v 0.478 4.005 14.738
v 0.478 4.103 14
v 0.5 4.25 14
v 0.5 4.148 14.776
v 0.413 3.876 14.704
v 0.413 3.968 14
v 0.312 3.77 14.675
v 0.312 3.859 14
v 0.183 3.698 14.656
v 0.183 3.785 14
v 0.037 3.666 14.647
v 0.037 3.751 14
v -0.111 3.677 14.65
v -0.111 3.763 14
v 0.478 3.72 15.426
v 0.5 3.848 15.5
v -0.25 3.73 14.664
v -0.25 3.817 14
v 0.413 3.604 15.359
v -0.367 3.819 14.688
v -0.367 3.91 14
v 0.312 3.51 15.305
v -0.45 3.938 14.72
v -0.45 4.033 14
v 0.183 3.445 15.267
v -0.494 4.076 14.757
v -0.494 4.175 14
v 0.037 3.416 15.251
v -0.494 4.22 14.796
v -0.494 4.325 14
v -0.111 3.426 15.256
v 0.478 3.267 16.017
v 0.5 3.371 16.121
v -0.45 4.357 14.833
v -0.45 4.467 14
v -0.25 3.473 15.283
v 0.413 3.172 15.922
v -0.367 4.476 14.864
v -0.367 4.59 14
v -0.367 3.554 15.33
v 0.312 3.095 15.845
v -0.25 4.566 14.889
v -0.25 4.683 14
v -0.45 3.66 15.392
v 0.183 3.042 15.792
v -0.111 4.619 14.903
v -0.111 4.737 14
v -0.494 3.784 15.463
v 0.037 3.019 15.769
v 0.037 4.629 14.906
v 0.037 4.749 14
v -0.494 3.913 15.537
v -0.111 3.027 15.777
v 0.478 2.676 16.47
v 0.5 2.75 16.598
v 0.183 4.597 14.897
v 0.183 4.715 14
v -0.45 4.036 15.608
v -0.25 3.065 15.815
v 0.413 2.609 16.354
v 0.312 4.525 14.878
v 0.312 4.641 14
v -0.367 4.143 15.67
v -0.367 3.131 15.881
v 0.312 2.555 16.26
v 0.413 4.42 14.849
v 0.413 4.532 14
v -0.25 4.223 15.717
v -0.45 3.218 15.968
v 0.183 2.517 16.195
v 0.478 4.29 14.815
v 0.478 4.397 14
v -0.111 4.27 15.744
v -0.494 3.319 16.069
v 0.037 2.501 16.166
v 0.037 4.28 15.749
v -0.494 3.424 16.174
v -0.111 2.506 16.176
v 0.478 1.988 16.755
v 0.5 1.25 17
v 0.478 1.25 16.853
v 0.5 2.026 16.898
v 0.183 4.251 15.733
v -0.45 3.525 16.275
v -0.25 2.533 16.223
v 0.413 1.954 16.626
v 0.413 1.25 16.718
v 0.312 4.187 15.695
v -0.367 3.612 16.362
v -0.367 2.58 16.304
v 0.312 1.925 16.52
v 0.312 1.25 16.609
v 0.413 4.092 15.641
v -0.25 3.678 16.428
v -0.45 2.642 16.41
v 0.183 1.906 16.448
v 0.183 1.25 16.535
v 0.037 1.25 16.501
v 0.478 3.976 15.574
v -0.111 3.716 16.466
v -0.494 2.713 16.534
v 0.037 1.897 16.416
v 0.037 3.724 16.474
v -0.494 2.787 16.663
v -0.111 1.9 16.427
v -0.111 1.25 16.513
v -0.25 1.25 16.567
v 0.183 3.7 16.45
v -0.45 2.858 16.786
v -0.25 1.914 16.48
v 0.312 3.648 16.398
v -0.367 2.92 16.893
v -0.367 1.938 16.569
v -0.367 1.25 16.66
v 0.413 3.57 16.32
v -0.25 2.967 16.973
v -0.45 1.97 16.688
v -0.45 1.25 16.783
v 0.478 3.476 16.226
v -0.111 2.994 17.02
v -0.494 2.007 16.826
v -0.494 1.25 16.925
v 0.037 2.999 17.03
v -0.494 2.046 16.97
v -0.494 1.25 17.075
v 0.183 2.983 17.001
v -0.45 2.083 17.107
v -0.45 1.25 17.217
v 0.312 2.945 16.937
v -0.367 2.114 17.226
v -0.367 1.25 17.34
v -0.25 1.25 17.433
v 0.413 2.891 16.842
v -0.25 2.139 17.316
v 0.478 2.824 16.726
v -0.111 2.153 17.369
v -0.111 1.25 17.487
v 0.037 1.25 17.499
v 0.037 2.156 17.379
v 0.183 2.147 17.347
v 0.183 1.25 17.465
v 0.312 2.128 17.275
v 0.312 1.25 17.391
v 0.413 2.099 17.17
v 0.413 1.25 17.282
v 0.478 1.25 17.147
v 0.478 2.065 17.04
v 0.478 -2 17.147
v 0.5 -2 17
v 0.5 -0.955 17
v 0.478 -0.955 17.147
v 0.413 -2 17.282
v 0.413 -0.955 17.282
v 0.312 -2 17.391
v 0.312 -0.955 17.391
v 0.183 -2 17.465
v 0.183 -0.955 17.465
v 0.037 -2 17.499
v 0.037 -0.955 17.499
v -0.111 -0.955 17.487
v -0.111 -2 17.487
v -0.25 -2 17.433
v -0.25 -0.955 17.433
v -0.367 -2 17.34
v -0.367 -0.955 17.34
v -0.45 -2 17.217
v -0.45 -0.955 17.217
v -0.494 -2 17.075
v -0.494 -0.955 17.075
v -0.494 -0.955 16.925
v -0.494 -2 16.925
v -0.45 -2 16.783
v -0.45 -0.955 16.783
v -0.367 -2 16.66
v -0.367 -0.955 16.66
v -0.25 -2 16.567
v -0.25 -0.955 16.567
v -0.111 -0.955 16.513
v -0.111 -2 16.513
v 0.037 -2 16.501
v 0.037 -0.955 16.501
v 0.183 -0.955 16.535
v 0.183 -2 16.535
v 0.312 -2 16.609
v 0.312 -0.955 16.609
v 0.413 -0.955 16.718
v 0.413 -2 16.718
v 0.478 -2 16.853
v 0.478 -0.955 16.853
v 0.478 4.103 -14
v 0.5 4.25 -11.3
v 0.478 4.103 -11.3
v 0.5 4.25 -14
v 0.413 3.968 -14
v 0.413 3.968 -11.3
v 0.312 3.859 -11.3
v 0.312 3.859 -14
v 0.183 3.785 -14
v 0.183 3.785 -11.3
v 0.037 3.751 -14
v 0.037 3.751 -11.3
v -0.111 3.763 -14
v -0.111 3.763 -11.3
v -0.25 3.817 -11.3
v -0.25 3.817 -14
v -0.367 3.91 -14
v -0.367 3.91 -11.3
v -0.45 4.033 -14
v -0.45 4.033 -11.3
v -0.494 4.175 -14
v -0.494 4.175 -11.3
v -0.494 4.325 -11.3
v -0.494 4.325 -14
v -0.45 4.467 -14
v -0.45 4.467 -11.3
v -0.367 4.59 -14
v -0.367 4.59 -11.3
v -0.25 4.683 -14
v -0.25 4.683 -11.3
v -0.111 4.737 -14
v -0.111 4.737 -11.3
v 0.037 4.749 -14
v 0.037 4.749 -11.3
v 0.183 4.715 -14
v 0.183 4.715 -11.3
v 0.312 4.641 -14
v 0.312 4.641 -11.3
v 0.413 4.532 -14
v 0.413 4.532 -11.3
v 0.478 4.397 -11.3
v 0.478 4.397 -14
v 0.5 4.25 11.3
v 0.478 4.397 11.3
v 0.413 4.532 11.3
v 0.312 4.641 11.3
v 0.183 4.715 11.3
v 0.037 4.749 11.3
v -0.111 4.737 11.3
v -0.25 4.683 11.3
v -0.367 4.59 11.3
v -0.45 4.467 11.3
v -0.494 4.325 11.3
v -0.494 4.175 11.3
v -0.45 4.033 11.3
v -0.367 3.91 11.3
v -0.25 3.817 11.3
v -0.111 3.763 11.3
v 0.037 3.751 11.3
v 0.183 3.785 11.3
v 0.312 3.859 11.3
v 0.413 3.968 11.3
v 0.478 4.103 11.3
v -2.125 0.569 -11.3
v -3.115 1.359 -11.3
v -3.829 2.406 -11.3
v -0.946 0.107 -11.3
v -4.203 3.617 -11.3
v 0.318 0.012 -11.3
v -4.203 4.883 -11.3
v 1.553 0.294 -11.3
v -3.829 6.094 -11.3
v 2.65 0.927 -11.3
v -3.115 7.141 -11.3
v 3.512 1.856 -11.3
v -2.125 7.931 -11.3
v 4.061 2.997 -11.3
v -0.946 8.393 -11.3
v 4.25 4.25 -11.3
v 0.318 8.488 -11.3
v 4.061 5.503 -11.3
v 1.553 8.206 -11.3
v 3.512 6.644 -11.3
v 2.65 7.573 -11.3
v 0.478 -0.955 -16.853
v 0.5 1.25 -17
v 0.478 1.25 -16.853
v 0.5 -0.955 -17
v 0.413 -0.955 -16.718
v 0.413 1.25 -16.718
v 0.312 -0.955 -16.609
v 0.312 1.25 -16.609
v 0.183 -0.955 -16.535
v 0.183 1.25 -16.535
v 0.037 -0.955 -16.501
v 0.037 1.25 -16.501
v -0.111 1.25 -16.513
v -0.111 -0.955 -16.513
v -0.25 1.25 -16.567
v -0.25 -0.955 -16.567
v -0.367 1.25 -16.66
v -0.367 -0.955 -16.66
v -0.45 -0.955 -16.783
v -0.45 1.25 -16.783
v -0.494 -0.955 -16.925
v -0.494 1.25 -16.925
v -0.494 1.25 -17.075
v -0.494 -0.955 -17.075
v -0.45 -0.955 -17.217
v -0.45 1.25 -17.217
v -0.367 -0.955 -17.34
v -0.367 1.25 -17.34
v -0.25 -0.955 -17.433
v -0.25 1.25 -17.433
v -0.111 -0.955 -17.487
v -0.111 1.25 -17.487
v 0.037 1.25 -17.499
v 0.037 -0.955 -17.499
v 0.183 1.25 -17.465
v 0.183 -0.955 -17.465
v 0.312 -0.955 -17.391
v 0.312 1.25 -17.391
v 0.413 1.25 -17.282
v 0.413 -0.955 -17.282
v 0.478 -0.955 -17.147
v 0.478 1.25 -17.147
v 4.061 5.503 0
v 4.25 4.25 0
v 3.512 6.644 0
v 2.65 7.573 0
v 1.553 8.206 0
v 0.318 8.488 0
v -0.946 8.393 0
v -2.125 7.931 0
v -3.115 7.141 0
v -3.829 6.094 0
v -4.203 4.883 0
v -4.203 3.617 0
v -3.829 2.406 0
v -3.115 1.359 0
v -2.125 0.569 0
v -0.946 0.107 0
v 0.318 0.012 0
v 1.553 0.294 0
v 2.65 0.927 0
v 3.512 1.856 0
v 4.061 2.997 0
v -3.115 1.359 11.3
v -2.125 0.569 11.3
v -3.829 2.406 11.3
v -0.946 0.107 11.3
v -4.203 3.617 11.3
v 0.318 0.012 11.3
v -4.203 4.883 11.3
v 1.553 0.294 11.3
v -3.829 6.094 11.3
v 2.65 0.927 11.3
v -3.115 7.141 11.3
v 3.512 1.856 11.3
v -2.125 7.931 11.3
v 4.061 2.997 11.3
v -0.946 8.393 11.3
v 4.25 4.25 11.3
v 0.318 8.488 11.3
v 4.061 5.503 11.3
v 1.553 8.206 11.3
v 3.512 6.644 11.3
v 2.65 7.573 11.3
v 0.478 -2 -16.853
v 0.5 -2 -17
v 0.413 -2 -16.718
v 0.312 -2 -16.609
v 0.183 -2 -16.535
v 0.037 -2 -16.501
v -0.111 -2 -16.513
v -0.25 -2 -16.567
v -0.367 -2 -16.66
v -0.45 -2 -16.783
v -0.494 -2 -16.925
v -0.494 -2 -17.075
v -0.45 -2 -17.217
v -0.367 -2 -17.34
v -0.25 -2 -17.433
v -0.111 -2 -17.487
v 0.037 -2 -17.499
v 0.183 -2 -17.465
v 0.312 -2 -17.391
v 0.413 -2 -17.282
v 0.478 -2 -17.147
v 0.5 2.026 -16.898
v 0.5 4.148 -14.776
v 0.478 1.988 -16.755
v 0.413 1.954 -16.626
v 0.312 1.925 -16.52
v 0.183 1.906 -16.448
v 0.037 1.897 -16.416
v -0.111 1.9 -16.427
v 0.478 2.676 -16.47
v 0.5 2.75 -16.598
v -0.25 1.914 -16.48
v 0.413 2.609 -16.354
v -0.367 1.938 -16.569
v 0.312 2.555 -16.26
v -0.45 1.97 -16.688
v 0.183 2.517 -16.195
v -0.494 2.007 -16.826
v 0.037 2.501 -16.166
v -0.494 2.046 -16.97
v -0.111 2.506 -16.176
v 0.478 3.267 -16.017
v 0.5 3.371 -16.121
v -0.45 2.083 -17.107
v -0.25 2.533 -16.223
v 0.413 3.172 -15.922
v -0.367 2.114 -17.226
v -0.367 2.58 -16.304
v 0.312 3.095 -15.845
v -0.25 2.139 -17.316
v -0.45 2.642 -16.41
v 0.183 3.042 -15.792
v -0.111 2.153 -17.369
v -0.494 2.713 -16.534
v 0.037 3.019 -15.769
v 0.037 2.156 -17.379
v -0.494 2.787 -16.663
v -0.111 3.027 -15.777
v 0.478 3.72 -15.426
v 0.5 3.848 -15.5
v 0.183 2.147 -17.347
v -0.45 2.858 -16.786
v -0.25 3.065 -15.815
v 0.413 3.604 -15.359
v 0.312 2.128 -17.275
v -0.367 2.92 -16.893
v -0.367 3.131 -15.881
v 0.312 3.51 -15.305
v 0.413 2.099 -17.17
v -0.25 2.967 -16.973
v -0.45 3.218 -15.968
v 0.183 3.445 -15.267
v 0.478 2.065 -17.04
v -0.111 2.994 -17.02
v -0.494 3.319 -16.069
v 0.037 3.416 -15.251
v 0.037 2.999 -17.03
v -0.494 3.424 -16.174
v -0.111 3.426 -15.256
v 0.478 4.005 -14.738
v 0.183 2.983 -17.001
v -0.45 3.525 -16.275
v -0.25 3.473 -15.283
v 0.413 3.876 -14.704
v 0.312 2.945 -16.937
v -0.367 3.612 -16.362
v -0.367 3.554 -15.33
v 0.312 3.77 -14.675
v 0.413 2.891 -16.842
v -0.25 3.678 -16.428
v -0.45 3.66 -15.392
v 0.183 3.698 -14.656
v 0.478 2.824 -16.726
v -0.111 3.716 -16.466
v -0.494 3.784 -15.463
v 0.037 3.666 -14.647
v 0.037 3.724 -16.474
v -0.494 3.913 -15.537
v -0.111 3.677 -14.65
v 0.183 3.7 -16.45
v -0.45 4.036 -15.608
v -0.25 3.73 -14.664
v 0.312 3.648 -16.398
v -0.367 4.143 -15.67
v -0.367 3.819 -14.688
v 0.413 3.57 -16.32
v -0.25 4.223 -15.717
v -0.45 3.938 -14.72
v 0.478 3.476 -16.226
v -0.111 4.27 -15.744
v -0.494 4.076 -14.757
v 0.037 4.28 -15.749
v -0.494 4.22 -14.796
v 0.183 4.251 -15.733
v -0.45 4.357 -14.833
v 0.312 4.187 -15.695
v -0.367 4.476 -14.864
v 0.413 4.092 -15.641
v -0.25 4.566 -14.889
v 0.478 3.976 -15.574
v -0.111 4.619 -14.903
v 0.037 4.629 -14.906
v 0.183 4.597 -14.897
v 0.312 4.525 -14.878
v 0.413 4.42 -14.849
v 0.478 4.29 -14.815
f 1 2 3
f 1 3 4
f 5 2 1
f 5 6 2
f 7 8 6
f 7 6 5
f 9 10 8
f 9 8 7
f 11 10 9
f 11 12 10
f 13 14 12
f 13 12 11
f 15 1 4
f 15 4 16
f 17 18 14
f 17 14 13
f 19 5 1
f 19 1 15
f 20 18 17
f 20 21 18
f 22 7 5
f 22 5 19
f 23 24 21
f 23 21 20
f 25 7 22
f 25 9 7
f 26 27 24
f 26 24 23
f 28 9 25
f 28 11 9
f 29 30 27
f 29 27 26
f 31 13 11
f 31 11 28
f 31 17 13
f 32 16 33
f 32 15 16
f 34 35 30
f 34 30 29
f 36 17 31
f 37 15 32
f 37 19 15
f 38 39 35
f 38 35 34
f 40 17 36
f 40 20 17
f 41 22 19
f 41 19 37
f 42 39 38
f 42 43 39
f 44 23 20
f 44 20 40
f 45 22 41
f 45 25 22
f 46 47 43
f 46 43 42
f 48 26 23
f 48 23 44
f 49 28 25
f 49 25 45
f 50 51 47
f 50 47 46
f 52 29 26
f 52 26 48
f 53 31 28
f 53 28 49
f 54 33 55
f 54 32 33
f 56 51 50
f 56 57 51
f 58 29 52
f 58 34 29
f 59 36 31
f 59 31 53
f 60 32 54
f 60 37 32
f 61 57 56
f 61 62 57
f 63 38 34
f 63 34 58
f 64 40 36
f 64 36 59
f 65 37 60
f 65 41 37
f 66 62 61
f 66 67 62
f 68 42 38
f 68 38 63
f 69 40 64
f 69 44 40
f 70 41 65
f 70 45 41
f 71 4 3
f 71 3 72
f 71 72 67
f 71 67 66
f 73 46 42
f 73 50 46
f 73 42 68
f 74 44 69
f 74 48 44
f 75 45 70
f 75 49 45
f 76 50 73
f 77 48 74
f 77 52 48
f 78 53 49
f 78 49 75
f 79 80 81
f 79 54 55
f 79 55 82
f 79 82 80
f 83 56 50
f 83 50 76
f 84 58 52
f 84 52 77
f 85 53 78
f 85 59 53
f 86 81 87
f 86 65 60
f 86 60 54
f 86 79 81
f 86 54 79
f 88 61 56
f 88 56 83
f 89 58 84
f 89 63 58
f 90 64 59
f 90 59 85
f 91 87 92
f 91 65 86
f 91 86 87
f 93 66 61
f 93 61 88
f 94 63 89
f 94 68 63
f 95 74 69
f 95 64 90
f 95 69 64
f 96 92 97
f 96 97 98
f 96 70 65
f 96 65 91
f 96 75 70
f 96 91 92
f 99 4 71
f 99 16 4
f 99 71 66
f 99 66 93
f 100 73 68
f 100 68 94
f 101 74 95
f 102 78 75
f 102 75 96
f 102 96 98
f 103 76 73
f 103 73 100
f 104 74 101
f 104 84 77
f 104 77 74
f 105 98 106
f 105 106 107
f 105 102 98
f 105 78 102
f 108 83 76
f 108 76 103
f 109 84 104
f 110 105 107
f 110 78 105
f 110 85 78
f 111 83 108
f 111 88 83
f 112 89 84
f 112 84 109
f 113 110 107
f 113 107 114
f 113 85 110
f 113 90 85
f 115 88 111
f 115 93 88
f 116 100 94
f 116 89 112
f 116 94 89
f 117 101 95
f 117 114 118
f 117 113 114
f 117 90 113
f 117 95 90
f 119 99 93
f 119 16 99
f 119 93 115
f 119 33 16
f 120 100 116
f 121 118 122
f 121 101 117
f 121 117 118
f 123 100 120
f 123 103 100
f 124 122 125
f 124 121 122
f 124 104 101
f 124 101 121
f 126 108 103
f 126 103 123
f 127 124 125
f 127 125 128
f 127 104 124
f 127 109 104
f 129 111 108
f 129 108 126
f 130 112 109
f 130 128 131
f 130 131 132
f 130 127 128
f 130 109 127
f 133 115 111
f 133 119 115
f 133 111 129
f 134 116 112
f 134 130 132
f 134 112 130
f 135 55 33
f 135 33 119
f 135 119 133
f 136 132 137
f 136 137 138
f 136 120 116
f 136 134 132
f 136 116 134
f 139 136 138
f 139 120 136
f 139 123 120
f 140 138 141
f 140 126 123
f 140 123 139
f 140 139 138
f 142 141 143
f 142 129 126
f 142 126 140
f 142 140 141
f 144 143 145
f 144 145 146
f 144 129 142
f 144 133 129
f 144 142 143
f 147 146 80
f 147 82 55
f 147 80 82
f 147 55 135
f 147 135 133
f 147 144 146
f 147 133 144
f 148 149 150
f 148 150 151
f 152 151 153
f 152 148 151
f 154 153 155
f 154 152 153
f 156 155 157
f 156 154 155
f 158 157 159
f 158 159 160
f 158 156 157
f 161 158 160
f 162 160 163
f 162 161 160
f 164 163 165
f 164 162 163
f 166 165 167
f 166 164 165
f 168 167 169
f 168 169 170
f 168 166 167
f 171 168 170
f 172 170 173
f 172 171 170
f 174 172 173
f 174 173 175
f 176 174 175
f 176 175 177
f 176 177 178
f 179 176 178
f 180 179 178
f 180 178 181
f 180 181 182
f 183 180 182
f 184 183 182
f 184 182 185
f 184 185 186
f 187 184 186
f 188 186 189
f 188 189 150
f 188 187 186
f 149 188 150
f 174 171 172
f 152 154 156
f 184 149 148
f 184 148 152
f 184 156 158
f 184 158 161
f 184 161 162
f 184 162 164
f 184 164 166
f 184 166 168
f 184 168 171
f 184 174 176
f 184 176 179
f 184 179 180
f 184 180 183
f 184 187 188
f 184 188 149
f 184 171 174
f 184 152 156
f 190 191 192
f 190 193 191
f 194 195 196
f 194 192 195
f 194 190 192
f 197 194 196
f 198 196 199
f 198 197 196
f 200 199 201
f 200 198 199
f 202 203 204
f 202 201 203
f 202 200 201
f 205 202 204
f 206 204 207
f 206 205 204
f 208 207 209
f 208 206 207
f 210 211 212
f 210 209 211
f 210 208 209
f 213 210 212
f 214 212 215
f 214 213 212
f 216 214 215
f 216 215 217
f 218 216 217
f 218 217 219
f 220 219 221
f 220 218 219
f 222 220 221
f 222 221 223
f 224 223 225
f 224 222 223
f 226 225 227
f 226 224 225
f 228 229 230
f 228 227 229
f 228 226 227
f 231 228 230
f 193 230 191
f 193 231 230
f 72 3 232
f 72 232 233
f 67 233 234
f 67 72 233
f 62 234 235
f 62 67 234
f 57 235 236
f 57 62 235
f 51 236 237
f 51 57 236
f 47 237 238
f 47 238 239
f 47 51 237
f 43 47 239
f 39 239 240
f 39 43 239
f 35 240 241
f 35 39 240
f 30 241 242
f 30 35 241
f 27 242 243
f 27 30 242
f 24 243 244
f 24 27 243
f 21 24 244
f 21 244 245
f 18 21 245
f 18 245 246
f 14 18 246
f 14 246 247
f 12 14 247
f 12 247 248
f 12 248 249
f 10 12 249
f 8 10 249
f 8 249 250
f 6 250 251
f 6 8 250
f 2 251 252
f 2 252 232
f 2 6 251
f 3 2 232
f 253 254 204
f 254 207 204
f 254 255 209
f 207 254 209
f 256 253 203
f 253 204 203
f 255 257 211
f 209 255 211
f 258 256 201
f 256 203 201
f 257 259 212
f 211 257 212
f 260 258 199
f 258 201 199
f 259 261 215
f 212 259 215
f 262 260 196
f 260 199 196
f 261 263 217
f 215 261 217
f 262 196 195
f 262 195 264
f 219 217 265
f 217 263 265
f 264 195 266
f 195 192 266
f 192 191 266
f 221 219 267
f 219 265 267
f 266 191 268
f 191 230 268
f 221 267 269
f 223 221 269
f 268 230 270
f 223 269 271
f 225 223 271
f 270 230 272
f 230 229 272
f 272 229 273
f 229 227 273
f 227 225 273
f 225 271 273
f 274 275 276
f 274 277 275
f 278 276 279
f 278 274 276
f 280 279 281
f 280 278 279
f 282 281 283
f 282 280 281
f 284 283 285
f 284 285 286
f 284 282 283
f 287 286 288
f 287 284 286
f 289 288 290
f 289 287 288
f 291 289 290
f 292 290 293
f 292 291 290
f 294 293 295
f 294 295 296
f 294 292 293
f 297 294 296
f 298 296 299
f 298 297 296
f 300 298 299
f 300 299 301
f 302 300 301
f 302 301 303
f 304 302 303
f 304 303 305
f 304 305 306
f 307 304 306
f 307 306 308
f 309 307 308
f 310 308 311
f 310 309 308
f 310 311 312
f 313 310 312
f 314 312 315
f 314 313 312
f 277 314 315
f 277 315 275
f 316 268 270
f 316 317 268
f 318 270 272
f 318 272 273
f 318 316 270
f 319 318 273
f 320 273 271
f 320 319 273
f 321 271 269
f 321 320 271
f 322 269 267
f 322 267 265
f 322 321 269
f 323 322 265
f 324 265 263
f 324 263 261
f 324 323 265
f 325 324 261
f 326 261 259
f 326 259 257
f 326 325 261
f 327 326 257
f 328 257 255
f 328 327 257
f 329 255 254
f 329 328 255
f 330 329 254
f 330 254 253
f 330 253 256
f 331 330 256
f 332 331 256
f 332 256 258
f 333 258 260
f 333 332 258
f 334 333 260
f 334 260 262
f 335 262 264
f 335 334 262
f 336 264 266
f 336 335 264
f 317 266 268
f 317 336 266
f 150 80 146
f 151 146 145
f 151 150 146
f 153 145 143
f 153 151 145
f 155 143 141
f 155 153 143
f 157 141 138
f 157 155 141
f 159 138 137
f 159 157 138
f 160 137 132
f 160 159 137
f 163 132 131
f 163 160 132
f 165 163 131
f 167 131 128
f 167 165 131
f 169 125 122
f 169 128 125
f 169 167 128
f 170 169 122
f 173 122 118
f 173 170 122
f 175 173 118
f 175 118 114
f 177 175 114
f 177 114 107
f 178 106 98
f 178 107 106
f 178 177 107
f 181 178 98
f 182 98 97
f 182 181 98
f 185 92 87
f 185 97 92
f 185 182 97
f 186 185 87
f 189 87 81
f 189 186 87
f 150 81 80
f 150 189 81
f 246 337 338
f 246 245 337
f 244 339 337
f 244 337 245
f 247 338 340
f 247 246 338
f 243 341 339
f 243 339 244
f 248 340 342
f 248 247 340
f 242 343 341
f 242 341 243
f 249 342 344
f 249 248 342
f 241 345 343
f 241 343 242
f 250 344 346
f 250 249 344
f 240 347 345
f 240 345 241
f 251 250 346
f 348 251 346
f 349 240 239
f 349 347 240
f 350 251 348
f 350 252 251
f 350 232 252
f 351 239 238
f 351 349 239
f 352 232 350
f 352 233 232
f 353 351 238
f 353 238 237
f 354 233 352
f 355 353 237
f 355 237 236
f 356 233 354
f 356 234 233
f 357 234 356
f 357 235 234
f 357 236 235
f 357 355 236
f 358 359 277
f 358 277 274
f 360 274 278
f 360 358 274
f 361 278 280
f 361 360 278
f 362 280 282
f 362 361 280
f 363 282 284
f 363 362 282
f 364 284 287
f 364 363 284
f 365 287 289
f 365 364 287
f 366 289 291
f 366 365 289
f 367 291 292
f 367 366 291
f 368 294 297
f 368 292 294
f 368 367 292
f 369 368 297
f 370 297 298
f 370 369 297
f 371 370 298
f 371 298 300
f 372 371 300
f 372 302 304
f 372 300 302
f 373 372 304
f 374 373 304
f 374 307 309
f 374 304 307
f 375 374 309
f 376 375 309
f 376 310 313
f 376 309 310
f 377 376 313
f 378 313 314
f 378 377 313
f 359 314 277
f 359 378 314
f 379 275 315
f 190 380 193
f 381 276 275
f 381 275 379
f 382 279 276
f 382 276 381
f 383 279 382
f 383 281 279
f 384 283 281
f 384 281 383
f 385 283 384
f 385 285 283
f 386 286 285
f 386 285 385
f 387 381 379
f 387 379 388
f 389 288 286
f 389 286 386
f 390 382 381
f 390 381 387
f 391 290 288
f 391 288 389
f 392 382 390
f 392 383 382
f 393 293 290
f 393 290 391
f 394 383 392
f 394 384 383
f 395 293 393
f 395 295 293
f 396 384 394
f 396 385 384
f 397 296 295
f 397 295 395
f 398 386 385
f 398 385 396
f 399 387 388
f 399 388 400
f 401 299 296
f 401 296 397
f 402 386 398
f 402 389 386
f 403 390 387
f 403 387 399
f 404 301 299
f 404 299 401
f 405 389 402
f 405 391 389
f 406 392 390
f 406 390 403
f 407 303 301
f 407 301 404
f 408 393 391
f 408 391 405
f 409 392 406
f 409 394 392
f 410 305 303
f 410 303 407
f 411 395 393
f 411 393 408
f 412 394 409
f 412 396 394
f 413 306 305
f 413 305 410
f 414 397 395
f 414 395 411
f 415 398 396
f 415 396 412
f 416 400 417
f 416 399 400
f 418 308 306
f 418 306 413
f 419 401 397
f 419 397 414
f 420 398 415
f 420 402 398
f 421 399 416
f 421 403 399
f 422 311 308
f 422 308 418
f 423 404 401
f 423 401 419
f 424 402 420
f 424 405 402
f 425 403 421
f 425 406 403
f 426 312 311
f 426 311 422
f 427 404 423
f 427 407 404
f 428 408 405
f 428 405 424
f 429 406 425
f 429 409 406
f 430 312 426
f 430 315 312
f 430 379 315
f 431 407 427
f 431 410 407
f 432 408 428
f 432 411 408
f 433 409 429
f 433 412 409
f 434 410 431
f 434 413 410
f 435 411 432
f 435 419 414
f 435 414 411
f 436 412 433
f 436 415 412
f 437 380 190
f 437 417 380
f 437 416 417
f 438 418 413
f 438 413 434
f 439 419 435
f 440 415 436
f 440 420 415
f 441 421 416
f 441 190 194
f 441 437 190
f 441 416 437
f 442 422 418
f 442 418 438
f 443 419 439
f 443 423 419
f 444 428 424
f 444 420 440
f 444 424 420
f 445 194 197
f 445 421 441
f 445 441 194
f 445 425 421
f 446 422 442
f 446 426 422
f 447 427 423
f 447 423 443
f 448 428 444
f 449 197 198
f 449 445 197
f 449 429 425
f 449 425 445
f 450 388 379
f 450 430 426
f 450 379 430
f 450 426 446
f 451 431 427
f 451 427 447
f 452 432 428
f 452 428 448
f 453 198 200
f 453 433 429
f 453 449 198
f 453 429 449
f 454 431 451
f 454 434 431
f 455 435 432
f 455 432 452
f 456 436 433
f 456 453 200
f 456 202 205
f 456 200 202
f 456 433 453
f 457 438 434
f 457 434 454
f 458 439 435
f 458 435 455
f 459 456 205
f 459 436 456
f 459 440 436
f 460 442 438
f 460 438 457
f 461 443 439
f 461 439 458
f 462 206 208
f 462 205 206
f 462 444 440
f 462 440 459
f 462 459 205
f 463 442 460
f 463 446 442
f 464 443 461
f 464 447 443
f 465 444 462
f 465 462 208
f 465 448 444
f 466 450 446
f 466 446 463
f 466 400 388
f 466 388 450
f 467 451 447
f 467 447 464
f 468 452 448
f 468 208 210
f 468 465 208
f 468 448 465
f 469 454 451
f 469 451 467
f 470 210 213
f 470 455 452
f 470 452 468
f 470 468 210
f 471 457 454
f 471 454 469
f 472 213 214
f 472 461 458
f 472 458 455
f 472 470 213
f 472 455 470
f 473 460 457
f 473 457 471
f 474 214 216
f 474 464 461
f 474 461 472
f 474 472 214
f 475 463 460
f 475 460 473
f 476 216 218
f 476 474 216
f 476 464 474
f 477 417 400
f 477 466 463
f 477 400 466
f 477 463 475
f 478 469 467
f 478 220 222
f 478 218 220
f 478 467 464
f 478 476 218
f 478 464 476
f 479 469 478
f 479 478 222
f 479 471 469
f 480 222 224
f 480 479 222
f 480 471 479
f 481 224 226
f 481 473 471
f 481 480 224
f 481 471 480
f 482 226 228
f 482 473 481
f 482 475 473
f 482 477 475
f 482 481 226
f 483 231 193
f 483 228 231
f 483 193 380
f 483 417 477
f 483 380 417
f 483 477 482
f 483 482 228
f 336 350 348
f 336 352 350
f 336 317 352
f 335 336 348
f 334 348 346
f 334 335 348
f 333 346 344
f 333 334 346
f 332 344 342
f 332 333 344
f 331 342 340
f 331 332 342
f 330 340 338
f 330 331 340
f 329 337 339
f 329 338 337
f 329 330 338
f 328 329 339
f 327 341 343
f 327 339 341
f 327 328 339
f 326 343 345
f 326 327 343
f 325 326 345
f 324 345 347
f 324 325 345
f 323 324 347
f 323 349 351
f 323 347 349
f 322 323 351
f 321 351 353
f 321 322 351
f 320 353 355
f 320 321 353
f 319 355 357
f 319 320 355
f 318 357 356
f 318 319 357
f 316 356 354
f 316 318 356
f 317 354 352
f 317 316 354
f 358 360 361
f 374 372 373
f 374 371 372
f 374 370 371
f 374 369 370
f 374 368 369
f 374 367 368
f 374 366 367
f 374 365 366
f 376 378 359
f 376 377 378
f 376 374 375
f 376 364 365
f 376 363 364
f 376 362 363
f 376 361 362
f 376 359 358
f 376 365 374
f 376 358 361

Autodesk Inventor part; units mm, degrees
ref_plane "YZ Plane" through (0, 0, 0) normal (1, 0, 0) x (0, 1, 0)
ref_plane "XZ Plane" through (0, 0, 0) normal (0, 1, 0) x (-1, 0, 0)
ref_plane "XY Plane" through (0, 0, 0) normal (0, 0, 1) x (1, 0, 0)
sketch "Sketch1" plane through (0, 0, 0) normal (0, 0, 1) x (1, 0, 0)
  circle A0 centre (0, 4.25) radius 4.25
  point P0 (0, 0)
  dimension "d0" = 8.5
  dimension "d1" = 4.25
extrude "Extrusion1" add sketch "Sketch1" along normal mid plane 22.6
sketch "Sketch2" plane through (0, 4.25, 11.3) normal (0, 0, 1) x (1, 0, 0)
  circle A0 centre (0, 0) radius 0.5
  point P0 (0, -4.25)
  dimension "d4" = 1
sketch "Sketch3" plane through (0, 0, 0) normal (1, 0, 0) x (0, 1, 0)
  line L0 (8.5, 11.3) -> (0, 11.3) projected
  line L1 (4.25, 11.3) -> (4.25, 14)
  line L2 (1.25, 17) -> (-0.9549, 17)
  arc A0 (4.25, 14) -> (1.25, 17) centre (1.25, 14) ccw
  line L3 (-0.9549, 17) -> (-2, 17)
  point P0 (0, 0)
  dimension "d5" = 17
  dimension "d6" = 3
  dimension "d8" = 2
sweep "Sweep1" add profiles "Sketch2" path "Sketch3" path curves L1 A0 L2 L3
mirror "Mirror1" about plane through (0, 0, 0) normal (0, 0, 1) of "Sweep1"
properties part number "MT5-0R05F3_Power_Resistor"
